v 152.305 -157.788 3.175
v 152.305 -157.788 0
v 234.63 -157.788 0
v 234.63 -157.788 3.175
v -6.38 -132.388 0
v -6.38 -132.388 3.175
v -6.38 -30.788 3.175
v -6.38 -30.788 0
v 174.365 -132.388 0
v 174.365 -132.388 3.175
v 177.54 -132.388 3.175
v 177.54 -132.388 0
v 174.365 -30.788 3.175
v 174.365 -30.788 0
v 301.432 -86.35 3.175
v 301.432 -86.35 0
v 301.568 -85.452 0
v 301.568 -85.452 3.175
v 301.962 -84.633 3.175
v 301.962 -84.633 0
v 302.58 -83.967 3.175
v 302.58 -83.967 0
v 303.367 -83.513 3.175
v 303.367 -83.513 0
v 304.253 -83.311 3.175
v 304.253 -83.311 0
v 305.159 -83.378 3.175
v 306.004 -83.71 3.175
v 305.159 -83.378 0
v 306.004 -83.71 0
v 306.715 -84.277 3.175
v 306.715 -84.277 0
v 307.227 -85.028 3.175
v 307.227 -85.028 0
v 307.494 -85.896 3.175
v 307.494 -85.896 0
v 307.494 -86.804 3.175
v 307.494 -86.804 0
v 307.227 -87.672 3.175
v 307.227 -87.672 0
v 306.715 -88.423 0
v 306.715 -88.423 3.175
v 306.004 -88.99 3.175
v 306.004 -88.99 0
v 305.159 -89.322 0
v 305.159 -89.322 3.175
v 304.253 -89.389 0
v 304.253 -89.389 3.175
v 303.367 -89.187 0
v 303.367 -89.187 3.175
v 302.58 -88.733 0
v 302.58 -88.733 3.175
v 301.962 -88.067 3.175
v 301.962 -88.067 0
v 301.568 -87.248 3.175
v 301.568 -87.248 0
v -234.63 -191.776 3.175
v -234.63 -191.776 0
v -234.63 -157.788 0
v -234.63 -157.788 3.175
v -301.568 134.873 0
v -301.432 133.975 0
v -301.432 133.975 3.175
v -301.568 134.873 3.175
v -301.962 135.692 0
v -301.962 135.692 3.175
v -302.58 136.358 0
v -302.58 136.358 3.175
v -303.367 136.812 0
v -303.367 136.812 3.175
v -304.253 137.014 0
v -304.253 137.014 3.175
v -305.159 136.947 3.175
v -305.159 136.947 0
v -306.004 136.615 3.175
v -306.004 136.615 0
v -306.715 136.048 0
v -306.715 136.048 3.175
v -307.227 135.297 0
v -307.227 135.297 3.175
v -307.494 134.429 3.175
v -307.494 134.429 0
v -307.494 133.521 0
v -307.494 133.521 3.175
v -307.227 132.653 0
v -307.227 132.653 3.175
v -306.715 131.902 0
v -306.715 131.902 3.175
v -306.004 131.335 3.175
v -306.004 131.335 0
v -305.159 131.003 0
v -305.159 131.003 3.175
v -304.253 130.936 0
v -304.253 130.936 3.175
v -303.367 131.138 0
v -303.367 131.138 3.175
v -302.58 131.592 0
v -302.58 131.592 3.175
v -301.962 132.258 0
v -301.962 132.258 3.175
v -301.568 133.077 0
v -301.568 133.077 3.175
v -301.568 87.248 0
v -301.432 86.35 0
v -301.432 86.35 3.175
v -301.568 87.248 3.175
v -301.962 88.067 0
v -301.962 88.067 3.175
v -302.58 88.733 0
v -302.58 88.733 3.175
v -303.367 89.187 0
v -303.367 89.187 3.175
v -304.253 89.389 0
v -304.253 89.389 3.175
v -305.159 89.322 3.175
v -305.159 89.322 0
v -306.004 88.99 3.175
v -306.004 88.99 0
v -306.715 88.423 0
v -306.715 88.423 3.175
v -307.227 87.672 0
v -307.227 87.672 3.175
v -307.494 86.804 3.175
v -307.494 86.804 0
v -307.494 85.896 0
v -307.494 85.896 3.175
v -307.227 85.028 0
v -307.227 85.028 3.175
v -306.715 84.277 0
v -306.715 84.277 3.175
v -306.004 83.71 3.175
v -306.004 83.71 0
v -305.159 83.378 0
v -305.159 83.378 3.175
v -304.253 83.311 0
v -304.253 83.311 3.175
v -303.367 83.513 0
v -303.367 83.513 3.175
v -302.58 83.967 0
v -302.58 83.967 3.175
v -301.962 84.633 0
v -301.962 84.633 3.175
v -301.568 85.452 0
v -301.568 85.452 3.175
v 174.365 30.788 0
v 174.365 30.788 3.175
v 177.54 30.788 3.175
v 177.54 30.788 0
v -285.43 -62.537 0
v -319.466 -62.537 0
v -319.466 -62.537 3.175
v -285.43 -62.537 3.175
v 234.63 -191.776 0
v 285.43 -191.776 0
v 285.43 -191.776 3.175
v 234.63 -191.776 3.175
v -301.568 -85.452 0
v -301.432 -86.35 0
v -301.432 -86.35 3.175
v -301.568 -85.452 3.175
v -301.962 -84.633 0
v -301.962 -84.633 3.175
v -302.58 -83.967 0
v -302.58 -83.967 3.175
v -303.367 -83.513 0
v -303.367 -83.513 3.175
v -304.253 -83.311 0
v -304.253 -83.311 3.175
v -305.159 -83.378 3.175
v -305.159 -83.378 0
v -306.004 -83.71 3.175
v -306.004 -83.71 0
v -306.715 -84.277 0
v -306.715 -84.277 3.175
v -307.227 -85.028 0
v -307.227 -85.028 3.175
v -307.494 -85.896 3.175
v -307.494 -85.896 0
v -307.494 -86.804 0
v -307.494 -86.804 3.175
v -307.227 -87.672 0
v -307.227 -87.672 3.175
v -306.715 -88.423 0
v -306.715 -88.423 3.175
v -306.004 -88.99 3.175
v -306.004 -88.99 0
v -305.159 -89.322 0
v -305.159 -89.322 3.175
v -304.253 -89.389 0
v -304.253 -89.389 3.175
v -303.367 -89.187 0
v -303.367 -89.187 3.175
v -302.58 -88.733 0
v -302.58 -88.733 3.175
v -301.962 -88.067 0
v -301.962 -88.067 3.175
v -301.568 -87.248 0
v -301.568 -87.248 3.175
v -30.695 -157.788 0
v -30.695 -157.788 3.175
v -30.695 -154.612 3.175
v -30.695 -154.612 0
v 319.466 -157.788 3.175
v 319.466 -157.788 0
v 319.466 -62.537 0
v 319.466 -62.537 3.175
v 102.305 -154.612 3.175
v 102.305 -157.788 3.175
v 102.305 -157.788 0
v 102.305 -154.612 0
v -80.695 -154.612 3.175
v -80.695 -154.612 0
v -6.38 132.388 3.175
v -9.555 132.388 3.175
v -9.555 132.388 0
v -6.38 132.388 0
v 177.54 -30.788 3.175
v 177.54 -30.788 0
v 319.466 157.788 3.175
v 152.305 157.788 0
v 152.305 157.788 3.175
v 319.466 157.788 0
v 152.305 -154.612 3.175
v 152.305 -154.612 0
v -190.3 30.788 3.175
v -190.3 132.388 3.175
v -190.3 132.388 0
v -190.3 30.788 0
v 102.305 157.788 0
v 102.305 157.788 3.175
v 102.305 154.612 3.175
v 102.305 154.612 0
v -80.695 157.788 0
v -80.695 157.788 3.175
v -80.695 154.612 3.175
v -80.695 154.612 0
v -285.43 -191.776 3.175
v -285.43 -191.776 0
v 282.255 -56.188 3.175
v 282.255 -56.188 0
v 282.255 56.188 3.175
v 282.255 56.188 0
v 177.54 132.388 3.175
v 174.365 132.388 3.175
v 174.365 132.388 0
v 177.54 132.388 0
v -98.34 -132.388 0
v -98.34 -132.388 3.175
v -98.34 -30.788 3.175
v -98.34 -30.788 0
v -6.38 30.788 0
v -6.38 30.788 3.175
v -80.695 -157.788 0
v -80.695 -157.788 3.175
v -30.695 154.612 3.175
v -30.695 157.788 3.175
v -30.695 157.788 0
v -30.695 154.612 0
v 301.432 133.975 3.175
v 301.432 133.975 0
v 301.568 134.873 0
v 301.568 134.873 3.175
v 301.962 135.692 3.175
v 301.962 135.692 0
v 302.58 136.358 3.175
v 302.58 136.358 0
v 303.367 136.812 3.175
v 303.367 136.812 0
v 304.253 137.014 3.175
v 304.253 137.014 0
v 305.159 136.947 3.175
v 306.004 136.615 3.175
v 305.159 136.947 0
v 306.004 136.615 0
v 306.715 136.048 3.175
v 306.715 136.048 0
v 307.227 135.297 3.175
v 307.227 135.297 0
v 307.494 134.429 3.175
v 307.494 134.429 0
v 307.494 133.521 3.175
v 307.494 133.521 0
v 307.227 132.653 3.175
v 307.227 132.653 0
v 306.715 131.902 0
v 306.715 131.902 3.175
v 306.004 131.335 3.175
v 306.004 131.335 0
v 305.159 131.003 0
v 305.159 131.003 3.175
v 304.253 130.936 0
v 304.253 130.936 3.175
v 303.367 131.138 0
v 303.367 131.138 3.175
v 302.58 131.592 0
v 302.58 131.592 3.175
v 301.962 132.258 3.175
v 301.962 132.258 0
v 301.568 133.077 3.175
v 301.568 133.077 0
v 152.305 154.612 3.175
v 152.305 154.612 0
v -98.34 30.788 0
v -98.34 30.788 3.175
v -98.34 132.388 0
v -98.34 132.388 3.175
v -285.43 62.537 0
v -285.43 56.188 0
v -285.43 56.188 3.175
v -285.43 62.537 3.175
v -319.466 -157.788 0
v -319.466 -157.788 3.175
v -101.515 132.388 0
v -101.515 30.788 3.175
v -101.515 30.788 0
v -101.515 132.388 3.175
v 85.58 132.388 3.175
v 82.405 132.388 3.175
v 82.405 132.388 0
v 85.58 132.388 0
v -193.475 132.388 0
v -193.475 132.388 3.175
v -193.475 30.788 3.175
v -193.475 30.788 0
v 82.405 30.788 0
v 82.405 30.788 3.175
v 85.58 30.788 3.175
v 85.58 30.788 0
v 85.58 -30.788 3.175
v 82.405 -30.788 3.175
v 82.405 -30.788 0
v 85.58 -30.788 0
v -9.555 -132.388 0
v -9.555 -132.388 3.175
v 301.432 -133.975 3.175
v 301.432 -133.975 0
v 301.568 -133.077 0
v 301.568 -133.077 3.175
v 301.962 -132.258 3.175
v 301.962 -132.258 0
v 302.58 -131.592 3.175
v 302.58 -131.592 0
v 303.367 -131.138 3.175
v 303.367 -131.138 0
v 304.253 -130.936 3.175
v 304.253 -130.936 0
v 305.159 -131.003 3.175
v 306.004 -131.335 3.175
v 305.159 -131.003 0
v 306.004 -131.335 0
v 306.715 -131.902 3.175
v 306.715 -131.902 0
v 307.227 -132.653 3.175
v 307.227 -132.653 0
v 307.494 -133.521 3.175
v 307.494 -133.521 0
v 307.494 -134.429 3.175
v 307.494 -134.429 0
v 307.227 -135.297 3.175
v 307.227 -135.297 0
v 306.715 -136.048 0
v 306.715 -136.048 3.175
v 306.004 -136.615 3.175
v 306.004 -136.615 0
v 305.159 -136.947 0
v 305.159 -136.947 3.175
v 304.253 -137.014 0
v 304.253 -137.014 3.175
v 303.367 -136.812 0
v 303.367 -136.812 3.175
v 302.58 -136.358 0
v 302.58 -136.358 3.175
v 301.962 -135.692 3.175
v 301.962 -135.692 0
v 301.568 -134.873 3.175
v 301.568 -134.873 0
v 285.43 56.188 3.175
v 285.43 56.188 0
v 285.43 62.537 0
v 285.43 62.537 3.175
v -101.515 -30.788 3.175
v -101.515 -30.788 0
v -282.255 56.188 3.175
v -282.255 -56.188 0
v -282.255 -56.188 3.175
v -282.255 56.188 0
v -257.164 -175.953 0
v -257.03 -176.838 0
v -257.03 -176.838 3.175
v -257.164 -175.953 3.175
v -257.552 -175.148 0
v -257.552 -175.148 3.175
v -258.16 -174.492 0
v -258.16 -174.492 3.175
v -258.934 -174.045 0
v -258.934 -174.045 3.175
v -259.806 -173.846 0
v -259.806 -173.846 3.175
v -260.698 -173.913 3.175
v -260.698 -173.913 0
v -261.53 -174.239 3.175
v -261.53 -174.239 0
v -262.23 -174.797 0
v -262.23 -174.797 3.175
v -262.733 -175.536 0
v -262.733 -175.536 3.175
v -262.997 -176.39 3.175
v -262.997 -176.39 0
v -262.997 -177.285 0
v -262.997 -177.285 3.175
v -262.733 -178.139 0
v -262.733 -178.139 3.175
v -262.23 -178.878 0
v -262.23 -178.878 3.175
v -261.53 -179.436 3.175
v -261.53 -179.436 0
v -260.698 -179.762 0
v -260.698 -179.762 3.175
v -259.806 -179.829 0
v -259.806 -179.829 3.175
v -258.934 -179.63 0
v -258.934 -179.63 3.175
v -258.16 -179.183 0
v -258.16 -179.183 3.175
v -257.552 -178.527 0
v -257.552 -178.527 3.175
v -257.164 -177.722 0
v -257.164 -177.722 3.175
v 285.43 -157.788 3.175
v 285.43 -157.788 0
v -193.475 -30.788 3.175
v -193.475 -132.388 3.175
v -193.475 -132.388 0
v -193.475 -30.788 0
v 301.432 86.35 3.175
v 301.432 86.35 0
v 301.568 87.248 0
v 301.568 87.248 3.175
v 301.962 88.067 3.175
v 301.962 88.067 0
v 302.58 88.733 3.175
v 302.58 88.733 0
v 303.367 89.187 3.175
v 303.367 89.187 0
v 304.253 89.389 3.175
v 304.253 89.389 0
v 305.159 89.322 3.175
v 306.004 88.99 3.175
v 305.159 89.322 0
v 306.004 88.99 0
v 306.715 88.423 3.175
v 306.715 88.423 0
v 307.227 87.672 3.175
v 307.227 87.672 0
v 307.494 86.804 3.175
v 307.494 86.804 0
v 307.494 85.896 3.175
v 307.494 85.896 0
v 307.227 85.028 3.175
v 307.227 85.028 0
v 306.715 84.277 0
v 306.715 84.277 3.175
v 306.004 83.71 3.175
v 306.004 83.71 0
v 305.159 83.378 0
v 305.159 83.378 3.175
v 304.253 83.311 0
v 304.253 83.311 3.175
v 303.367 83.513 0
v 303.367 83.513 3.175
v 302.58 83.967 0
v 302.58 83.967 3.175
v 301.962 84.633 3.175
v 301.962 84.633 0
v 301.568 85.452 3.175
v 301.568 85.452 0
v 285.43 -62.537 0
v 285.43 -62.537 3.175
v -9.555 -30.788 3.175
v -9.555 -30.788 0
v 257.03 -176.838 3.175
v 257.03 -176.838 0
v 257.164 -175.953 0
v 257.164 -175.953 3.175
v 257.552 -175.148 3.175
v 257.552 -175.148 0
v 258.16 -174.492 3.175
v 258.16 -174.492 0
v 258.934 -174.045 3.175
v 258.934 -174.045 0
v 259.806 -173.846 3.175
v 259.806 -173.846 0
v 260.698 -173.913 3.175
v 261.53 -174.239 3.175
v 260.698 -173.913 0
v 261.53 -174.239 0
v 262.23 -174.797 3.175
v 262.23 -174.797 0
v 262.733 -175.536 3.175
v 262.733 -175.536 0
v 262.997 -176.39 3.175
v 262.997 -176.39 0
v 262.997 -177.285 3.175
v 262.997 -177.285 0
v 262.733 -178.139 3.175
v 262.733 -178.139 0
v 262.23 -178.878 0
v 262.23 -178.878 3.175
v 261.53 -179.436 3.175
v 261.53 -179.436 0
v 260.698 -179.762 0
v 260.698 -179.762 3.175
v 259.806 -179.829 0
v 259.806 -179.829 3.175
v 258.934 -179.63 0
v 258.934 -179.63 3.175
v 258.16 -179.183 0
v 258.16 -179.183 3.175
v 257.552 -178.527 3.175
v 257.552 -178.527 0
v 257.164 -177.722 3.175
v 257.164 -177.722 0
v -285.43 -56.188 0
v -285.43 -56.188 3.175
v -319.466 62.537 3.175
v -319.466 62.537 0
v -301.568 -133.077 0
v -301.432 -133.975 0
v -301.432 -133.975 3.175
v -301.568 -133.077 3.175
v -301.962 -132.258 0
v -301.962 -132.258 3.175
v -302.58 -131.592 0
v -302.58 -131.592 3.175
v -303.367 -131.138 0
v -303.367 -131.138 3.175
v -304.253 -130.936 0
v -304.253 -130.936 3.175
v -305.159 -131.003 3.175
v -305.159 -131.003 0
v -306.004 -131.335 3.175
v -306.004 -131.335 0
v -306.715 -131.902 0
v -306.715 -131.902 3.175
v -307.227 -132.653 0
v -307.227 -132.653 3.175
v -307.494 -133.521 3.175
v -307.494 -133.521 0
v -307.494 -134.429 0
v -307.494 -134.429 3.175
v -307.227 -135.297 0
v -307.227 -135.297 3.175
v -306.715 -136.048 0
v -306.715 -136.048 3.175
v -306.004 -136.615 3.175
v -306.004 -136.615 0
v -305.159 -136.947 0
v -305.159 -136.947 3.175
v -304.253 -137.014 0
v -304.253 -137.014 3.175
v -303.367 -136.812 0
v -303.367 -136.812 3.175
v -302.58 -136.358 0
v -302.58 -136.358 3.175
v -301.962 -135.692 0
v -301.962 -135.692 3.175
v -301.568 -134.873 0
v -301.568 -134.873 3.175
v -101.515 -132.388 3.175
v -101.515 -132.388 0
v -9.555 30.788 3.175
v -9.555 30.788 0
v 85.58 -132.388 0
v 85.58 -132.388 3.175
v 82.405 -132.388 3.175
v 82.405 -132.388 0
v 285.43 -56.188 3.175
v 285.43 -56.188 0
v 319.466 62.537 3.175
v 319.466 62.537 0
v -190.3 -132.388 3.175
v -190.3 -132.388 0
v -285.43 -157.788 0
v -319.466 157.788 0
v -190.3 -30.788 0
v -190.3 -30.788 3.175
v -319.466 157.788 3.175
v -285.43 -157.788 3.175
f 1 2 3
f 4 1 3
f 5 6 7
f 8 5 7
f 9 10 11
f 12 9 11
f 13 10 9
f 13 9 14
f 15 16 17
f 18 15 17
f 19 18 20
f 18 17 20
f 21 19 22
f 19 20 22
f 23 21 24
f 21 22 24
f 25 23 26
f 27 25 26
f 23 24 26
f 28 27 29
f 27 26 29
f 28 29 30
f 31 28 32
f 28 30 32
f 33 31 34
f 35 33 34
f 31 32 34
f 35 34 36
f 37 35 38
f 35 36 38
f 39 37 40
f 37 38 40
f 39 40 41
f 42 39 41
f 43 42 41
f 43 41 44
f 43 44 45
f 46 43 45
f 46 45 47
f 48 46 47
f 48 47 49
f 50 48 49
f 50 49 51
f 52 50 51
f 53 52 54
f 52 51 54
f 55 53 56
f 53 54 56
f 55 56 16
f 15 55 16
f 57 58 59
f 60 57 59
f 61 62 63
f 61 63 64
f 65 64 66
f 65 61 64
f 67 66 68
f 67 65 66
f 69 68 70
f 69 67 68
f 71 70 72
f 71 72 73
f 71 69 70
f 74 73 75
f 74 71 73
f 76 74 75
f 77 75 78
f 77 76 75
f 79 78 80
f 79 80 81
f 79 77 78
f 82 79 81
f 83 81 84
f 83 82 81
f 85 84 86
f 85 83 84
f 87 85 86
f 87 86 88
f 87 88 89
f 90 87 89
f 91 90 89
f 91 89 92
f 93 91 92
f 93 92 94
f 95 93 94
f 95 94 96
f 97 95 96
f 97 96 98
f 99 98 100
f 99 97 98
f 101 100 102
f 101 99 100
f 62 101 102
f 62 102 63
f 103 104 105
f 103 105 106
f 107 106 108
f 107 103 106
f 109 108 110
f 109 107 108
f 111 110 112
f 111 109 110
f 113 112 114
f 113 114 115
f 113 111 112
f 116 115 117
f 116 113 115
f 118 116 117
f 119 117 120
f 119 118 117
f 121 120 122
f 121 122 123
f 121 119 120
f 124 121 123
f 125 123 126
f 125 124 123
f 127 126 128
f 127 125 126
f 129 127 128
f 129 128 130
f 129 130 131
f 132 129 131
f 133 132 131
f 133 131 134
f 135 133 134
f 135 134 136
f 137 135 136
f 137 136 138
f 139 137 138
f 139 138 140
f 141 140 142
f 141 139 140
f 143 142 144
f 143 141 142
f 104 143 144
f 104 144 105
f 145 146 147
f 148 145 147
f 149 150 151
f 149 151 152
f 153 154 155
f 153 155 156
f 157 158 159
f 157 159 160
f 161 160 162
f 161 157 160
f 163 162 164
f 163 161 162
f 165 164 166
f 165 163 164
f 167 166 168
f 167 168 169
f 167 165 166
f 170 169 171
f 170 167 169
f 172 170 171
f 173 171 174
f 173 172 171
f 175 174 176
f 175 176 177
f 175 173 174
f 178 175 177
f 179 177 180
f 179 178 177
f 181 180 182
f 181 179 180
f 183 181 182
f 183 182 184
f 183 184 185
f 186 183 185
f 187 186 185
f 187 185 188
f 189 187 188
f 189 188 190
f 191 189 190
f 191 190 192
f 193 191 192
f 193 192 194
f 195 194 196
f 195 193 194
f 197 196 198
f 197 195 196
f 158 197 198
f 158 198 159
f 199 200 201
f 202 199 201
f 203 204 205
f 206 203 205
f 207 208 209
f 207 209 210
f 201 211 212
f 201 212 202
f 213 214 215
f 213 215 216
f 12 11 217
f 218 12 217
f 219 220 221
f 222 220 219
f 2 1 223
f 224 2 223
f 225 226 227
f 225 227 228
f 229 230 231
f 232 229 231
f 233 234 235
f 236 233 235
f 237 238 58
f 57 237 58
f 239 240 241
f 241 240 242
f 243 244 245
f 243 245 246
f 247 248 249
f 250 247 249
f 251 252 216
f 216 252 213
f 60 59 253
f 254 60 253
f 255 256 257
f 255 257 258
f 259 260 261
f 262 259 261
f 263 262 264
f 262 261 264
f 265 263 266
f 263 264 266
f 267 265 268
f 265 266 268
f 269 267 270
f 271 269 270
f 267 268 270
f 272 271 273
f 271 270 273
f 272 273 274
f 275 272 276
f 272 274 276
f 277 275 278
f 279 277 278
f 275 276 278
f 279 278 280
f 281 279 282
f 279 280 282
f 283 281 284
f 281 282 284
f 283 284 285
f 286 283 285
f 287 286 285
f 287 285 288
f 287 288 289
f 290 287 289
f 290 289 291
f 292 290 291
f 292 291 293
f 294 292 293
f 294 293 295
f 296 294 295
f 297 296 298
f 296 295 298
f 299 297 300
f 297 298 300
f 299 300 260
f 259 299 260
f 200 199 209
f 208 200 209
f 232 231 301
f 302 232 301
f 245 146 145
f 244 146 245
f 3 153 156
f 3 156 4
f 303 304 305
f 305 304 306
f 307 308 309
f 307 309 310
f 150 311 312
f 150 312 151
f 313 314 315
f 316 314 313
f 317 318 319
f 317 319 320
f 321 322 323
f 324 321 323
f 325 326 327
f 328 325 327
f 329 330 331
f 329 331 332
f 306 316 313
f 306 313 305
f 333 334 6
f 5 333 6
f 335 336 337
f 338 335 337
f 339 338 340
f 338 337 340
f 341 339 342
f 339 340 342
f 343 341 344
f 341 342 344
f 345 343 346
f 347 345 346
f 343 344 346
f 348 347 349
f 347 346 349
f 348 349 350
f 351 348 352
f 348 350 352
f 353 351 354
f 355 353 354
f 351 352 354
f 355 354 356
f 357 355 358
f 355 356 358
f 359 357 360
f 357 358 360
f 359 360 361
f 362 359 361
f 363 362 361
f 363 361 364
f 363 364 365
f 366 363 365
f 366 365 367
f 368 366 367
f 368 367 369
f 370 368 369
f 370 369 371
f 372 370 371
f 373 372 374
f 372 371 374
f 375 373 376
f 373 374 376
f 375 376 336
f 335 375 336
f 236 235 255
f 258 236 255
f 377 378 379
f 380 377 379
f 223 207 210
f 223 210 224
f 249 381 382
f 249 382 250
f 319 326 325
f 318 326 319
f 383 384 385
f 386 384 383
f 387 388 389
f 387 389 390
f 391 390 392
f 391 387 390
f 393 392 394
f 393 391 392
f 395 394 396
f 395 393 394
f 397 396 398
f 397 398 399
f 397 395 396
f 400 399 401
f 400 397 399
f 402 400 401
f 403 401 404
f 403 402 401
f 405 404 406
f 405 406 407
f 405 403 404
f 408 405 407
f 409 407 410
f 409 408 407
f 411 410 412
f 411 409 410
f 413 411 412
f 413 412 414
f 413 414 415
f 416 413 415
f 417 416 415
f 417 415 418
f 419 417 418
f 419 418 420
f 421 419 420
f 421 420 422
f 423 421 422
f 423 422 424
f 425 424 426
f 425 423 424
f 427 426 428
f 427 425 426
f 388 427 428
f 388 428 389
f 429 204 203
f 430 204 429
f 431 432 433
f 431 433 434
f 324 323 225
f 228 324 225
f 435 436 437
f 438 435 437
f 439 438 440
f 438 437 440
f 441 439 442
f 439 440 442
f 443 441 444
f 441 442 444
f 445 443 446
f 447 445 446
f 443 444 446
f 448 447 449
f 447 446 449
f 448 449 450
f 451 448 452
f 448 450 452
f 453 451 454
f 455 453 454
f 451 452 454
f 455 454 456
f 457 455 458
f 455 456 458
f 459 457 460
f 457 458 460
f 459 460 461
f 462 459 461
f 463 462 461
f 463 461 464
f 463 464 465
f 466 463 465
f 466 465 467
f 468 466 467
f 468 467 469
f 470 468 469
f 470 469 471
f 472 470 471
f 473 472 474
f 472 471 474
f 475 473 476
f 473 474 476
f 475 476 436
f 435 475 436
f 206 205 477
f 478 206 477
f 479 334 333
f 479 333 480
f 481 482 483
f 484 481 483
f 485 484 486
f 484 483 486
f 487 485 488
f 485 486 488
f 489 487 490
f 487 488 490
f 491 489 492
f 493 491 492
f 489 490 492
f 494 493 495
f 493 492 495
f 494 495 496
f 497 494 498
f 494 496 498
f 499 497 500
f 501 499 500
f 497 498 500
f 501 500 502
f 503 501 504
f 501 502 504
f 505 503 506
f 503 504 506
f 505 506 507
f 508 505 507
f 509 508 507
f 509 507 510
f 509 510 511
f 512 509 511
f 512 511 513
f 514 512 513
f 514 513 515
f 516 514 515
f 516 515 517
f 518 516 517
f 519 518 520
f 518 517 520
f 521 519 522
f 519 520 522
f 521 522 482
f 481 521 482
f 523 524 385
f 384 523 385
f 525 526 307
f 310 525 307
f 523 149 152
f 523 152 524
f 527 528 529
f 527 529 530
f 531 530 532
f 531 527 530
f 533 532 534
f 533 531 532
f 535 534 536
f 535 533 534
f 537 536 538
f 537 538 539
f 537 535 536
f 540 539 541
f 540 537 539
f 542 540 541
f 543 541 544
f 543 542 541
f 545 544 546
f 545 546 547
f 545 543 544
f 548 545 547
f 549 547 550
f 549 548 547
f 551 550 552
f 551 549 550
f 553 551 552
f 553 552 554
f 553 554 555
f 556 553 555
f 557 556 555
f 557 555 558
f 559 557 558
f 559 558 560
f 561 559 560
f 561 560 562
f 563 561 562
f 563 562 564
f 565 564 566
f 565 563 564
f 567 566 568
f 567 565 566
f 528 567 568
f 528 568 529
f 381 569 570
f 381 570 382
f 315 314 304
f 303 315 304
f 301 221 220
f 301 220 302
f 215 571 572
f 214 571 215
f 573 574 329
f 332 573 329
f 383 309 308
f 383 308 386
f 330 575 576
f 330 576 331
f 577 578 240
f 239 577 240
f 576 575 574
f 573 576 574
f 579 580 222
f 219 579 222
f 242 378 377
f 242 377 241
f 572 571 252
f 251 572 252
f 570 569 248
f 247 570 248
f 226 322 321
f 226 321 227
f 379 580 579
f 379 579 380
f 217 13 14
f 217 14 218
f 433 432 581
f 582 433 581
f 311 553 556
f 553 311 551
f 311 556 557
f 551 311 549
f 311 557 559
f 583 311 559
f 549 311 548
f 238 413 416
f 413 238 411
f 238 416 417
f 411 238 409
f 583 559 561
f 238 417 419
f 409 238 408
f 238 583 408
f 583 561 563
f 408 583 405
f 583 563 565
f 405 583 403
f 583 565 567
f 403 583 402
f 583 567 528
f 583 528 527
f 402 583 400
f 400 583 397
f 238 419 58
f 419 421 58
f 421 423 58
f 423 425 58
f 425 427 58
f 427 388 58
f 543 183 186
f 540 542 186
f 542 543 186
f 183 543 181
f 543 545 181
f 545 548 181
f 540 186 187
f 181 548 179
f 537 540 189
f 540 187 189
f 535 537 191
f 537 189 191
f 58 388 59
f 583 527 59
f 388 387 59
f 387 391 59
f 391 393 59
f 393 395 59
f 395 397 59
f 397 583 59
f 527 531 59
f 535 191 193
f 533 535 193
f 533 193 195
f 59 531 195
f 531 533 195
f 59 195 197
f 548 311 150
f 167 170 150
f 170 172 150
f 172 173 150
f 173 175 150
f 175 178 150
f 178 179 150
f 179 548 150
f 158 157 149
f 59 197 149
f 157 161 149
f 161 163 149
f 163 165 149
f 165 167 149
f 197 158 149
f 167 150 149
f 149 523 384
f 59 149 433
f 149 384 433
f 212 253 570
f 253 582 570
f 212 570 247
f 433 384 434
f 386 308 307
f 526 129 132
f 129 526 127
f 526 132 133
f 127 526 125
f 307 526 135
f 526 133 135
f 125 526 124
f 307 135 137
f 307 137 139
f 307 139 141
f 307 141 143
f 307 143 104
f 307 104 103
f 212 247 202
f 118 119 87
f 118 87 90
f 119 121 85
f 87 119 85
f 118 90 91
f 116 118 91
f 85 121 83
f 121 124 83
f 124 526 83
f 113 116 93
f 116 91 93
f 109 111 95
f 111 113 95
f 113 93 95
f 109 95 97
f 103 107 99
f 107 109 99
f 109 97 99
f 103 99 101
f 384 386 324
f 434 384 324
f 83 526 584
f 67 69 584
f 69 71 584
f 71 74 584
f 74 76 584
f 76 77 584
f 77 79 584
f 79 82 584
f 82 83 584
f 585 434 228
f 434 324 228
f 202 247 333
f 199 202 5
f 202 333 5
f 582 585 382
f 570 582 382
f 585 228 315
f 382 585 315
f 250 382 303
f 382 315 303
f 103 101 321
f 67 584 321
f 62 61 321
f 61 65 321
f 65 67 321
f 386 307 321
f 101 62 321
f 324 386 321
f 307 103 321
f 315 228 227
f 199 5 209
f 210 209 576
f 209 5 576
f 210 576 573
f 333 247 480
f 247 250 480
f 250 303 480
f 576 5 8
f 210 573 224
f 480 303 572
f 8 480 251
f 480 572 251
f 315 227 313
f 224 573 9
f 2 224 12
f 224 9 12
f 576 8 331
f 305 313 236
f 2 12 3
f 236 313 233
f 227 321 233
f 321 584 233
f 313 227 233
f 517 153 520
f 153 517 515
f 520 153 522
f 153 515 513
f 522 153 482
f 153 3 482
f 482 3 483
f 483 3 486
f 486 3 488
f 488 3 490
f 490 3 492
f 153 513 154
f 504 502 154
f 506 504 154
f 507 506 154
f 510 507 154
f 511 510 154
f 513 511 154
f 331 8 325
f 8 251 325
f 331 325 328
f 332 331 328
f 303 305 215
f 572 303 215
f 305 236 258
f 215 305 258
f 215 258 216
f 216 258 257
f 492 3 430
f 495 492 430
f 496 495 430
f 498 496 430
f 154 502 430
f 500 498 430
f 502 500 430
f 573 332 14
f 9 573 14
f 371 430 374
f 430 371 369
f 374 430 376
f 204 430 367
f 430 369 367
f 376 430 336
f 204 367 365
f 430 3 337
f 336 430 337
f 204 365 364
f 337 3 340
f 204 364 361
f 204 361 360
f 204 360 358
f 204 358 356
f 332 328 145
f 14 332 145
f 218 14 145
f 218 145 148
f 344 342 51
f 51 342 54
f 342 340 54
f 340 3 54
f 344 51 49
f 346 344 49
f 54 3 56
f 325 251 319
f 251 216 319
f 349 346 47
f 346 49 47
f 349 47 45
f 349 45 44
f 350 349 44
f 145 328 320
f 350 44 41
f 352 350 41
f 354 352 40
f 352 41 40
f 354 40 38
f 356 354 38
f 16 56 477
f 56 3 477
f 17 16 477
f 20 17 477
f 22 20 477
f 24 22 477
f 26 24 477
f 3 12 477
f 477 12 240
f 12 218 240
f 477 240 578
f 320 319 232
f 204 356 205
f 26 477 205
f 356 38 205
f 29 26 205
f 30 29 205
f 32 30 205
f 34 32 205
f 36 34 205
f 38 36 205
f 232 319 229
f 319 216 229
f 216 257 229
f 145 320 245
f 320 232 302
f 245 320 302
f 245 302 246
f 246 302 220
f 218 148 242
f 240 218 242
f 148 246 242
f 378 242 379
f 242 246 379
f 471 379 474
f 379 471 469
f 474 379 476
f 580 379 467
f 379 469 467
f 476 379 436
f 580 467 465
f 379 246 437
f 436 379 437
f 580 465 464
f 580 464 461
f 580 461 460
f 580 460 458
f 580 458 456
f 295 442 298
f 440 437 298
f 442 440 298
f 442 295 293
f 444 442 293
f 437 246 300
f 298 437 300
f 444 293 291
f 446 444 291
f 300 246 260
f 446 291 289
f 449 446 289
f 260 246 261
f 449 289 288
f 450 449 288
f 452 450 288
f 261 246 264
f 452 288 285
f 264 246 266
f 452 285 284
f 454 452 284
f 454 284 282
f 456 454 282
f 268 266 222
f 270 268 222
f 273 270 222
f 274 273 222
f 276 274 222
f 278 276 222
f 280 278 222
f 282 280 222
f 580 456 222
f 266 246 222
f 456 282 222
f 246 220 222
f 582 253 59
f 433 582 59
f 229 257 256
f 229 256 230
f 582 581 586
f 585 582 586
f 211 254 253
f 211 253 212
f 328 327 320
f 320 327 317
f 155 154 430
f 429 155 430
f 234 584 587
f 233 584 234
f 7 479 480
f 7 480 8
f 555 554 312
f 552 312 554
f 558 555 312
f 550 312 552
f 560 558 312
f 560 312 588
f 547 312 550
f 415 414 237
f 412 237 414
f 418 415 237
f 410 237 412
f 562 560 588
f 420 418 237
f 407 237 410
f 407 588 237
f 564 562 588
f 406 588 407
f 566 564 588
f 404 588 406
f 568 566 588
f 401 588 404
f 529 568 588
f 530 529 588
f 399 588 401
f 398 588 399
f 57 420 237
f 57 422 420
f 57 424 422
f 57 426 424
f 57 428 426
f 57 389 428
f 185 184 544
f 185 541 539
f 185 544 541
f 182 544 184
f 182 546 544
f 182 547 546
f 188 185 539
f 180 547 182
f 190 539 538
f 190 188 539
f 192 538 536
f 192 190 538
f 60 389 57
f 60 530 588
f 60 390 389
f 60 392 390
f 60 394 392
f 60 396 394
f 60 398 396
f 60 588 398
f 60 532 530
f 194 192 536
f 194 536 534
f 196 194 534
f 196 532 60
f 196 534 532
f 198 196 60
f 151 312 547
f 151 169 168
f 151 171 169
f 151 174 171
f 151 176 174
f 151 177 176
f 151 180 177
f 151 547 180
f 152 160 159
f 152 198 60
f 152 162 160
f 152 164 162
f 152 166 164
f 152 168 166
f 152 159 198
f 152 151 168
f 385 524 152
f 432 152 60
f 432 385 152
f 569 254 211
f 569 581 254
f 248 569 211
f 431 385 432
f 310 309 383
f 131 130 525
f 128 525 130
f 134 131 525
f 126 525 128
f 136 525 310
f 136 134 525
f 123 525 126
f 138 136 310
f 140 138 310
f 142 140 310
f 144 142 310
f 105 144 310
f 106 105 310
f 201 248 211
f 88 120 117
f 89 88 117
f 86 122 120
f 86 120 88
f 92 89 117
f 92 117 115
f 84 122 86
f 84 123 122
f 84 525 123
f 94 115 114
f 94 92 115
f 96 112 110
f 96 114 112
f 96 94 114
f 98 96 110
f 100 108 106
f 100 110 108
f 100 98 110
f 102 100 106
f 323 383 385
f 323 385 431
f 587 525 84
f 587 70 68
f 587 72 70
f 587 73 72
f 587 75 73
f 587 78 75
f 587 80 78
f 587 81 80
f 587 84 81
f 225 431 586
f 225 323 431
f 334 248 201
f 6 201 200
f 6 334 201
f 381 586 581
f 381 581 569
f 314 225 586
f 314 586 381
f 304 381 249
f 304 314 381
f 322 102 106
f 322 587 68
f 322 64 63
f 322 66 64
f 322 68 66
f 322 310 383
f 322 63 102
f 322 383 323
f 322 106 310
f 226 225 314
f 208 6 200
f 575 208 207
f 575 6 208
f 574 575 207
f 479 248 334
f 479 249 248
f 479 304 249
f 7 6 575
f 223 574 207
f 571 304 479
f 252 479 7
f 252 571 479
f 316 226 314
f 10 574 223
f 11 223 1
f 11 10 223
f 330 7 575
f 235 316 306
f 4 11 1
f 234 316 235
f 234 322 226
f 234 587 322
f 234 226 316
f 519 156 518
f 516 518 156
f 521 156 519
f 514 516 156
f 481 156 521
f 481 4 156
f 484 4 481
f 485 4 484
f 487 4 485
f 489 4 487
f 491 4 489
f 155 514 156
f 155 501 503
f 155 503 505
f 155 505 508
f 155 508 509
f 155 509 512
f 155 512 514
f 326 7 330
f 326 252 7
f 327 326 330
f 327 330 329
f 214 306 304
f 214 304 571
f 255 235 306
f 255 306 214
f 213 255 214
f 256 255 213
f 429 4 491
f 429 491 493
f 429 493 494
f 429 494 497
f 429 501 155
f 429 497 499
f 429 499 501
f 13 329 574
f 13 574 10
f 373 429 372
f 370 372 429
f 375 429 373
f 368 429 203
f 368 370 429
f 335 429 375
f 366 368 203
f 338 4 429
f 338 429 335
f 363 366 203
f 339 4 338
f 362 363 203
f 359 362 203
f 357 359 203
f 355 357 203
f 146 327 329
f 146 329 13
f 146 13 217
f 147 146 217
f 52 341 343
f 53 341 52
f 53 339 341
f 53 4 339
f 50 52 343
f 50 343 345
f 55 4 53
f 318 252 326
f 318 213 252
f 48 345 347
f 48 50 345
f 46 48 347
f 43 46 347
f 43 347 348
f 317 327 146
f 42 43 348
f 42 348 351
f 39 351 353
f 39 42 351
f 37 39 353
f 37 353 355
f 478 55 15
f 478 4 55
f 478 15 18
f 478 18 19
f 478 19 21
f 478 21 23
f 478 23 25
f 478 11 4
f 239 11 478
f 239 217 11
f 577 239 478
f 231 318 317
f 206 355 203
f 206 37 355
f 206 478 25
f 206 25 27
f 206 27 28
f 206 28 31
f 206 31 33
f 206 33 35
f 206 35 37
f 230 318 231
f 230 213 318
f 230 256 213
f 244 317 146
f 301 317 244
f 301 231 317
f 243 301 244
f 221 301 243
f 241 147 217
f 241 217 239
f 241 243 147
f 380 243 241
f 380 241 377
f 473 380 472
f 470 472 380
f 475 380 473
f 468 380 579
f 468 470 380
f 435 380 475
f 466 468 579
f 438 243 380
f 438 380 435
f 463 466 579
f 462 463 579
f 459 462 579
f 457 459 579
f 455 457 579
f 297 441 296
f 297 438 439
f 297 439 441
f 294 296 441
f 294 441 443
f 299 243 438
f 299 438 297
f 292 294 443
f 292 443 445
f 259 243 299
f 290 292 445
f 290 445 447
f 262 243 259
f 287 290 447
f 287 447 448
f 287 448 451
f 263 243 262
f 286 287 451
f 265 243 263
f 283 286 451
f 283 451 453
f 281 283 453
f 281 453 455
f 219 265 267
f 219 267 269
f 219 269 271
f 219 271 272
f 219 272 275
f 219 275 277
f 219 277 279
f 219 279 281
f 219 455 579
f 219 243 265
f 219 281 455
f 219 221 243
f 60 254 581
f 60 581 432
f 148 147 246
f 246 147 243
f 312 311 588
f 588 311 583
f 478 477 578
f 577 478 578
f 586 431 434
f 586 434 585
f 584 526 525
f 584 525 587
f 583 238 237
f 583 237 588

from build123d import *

# Parameters (mm, degrees)
SKETCH1_W                 = 570.860988324
SKETCH1_H                 = 315.575
BOSS_EXTRUDE1_DEPTH       = 3.175
SKETCH2_W                 = 3.175
SKETCH2_H                 = 101.6
CUT_EXTRUDE1_DEPTH        = 3.175
SKETCH7_W                 = 50
SKETCH7_H                 = 3.175
CUT_EXTRUDE5_DEPTH        = 3.175
LPATTERN2_COUNT           = 5
LPATTERN2_PITCH           = 91.96
LPATTERN2_COPY_1_SKETCH_W = 3.175
LPATTERN2_COPY_1_SKETCH_H = 101.6
LPATTERN2_COPY_1_DEPTH    = 3.175
LPATTERN2_COPY_2_SKETCH_W = 3.175
LPATTERN2_COPY_2_SKETCH_H = 101.6
LPATTERN2_COPY_2_DEPTH    = 3.175
LPATTERN2_COPY_3_SKETCH_W = 3.175
LPATTERN2_COPY_3_SKETCH_H = 101.6
LPATTERN2_COPY_3_DEPTH    = 3.175
LPATTERN2_COPY_4_SKETCH_W = 3.175
LPATTERN2_COPY_4_SKETCH_H = 101.6
LPATTERN2_COPY_4_DEPTH    = 3.175
SKETCH9_W                 = 34.036
SKETCH9_H                 = 95.25
SKETCH9_R                 = 3.048
SKETCH9_W_2               = 50.8
SKETCH9_H_2               = 33.988
SKETCH9_R_2               = 3
BOSS_EXTRUDE3_DEPTH       = 3.175
SKETCH10_W                = 3.175
SKETCH10_H                = 112.375
CUT_EXTRUDE6_DEPTH        = 373.621475384


with BuildPart() as part:
    # Sketch1 → Boss-Extrude1 (new body)
    with BuildSketch(Plane.XY):
        Rectangle(SKETCH1_W, SKETCH1_H)
    extrude(amount=BOSS_EXTRUDE1_DEPTH)

    # Sketch2 → Cut-Extrude1 (cut)
    with BuildSketch(Plane.XY.offset(3.175)):
        with Locations((-191.887994162, -81.5875)):
            Rectangle(SKETCH2_W, SKETCH2_H)
    cut_extrude1 = extrude(amount=-CUT_EXTRUDE1_DEPTH, mode=Mode.SUBTRACT)

    # Sketch7 → Cut-Extrude5 (cut)
    with BuildSketch(Plane.XY.offset(3.175)):
        with Locations((127.304934912, -156.2)):
            Rectangle(SKETCH7_W, SKETCH7_H)
        with Locations((-55.695065088, -156.2)):
            Rectangle(SKETCH7_W, SKETCH7_H)
    cut_extrude5 = extrude(amount=-CUT_EXTRUDE5_DEPTH, mode=Mode.SUBTRACT)

    # Mirror3: Cut-Extrude1 across plane
    add(cut_extrude1.mirror(Plane.ZX), mode=Mode.SUBTRACT)

    # LPattern2: Cut-Extrude1 ×5
    with Locations(*[(i * LPATTERN2_PITCH, 0, 0) for i in range(1, LPATTERN2_COUNT)]):
        add(cut_extrude1, mode=Mode.SUBTRACT)

    # LPattern2 copy 1 sketch → LPattern2 copy 1 (cut)
    with BuildSketch(Plane(origin=(91.96, 0, 3.175), x_dir=(1, 0, 0), z_dir=(0, 0, 1))):
        with Locations((-191.887994162, 81.5875)):
            Rectangle(LPATTERN2_COPY_1_SKETCH_W, LPATTERN2_COPY_1_SKETCH_H)
    extrude(amount=-LPATTERN2_COPY_1_DEPTH, mode=Mode.SUBTRACT)

    # LPattern2 copy 2 sketch → LPattern2 copy 2 (cut)
    with BuildSketch(Plane(origin=(183.92, 0, 3.175), x_dir=(1, 0, 0), z_dir=(0, 0, 1))):
        with Locations((-191.887994162, 81.5875)):
            Rectangle(LPATTERN2_COPY_2_SKETCH_W, LPATTERN2_COPY_2_SKETCH_H)
    extrude(amount=-LPATTERN2_COPY_2_DEPTH, mode=Mode.SUBTRACT)

    # LPattern2 copy 3 sketch → LPattern2 copy 3 (cut)
    with BuildSketch(Plane(origin=(275.88, 0, 3.175), x_dir=(1, 0, 0), z_dir=(0, 0, 1))):
        with Locations((-191.887994162, 81.5875)):
            Rectangle(LPATTERN2_COPY_3_SKETCH_W, LPATTERN2_COPY_3_SKETCH_H)
    extrude(amount=-LPATTERN2_COPY_3_DEPTH, mode=Mode.SUBTRACT)

    # LPattern2 copy 4 sketch → LPattern2 copy 4 (cut)
    with BuildSketch(Plane(origin=(367.84, 0, 3.175), x_dir=(1, 0, 0), z_dir=(0, 0, 1))):
        with Locations((-191.887994162, 81.5875)):
            Rectangle(LPATTERN2_COPY_4_SKETCH_W, LPATTERN2_COPY_4_SKETCH_H)
    extrude(amount=-LPATTERN2_COPY_4_DEPTH, mode=Mode.SUBTRACT)

    # Sketch9 → Boss-Extrude3 (add)
    # profile 1 of 3: a face of its own
    with BuildSketch(Plane(origin=(0, 0, 0), x_dir=(-1, 0, 0), z_dir=(0, 0, -1))):
        with Locations((-302.448494162, 110.1625)):
            Rectangle(SKETCH9_W, SKETCH9_H)
        with Locations((-304.480494162, 86.35)):
            Circle(SKETCH9_R, mode=Mode.SUBTRACT)
        with Locations((-304.480494162, 133.975)):
            Circle(SKETCH9_R, mode=Mode.SUBTRACT)
    # profile 2 of 3: a face of its own
    with BuildSketch(Plane(origin=(0, 0, 0), x_dir=(-1, 0, 0), z_dir=(0, 0, -1))):
        with Locations((-302.448494162, -110.1625)):
            Rectangle(SKETCH9_W, SKETCH9_H)
        with Locations((-304.480494162, -133.975)):
            Circle(SKETCH9_R, mode=Mode.SUBTRACT)
        with Locations((-304.480494162, -86.35)):
            Circle(SKETCH9_R, mode=Mode.SUBTRACT)
    # profile 3 of 3: a face of its own
    with BuildSketch(Plane(origin=(0, 0, 0), x_dir=(-1, 0, 0), z_dir=(0, 0, -1))):
        with Locations((-260.030494162, -174.7815)):
            Rectangle(SKETCH9_W_2, SKETCH9_H_2)
        with Locations((-260.030494162, -176.8375)):
            Circle(SKETCH9_R_2, mode=Mode.SUBTRACT)
    boss_extrude3 = extrude(amount=-BOSS_EXTRUDE3_DEPTH)

    # Mirror4: Boss-Extrude3 across plane
    add(boss_extrude3.mirror(Plane(origin=(0, 0, 0), x_dir=(0, 0, 1), z_dir=(1, 0, 0))))

    # Mirror5: Cut-Extrude5 across plane
    add(cut_extrude5.mirror(Plane.ZX), mode=Mode.SUBTRACT)

    # Sketch10 → Cut-Extrude6 (cut, through all)
    with BuildSketch(Plane(origin=(0, 0, 0), x_dir=(-1, 0, 0), z_dir=(0, 0, -1))):
        with Locations((-283.842994162, 0)):
            Rectangle(SKETCH10_W, SKETCH10_H)
    cut_extrude6 = extrude(amount=-CUT_EXTRUDE6_DEPTH, mode=Mode.SUBTRACT)

    # Mirror6: Cut-Extrude6 across plane
    add(cut_extrude6.mirror(Plane(origin=(0, 0, 0), x_dir=(0, 0, 1), z_dir=(1, 0, 0))), mode=Mode.SUBTRACT)


solid = part.part
